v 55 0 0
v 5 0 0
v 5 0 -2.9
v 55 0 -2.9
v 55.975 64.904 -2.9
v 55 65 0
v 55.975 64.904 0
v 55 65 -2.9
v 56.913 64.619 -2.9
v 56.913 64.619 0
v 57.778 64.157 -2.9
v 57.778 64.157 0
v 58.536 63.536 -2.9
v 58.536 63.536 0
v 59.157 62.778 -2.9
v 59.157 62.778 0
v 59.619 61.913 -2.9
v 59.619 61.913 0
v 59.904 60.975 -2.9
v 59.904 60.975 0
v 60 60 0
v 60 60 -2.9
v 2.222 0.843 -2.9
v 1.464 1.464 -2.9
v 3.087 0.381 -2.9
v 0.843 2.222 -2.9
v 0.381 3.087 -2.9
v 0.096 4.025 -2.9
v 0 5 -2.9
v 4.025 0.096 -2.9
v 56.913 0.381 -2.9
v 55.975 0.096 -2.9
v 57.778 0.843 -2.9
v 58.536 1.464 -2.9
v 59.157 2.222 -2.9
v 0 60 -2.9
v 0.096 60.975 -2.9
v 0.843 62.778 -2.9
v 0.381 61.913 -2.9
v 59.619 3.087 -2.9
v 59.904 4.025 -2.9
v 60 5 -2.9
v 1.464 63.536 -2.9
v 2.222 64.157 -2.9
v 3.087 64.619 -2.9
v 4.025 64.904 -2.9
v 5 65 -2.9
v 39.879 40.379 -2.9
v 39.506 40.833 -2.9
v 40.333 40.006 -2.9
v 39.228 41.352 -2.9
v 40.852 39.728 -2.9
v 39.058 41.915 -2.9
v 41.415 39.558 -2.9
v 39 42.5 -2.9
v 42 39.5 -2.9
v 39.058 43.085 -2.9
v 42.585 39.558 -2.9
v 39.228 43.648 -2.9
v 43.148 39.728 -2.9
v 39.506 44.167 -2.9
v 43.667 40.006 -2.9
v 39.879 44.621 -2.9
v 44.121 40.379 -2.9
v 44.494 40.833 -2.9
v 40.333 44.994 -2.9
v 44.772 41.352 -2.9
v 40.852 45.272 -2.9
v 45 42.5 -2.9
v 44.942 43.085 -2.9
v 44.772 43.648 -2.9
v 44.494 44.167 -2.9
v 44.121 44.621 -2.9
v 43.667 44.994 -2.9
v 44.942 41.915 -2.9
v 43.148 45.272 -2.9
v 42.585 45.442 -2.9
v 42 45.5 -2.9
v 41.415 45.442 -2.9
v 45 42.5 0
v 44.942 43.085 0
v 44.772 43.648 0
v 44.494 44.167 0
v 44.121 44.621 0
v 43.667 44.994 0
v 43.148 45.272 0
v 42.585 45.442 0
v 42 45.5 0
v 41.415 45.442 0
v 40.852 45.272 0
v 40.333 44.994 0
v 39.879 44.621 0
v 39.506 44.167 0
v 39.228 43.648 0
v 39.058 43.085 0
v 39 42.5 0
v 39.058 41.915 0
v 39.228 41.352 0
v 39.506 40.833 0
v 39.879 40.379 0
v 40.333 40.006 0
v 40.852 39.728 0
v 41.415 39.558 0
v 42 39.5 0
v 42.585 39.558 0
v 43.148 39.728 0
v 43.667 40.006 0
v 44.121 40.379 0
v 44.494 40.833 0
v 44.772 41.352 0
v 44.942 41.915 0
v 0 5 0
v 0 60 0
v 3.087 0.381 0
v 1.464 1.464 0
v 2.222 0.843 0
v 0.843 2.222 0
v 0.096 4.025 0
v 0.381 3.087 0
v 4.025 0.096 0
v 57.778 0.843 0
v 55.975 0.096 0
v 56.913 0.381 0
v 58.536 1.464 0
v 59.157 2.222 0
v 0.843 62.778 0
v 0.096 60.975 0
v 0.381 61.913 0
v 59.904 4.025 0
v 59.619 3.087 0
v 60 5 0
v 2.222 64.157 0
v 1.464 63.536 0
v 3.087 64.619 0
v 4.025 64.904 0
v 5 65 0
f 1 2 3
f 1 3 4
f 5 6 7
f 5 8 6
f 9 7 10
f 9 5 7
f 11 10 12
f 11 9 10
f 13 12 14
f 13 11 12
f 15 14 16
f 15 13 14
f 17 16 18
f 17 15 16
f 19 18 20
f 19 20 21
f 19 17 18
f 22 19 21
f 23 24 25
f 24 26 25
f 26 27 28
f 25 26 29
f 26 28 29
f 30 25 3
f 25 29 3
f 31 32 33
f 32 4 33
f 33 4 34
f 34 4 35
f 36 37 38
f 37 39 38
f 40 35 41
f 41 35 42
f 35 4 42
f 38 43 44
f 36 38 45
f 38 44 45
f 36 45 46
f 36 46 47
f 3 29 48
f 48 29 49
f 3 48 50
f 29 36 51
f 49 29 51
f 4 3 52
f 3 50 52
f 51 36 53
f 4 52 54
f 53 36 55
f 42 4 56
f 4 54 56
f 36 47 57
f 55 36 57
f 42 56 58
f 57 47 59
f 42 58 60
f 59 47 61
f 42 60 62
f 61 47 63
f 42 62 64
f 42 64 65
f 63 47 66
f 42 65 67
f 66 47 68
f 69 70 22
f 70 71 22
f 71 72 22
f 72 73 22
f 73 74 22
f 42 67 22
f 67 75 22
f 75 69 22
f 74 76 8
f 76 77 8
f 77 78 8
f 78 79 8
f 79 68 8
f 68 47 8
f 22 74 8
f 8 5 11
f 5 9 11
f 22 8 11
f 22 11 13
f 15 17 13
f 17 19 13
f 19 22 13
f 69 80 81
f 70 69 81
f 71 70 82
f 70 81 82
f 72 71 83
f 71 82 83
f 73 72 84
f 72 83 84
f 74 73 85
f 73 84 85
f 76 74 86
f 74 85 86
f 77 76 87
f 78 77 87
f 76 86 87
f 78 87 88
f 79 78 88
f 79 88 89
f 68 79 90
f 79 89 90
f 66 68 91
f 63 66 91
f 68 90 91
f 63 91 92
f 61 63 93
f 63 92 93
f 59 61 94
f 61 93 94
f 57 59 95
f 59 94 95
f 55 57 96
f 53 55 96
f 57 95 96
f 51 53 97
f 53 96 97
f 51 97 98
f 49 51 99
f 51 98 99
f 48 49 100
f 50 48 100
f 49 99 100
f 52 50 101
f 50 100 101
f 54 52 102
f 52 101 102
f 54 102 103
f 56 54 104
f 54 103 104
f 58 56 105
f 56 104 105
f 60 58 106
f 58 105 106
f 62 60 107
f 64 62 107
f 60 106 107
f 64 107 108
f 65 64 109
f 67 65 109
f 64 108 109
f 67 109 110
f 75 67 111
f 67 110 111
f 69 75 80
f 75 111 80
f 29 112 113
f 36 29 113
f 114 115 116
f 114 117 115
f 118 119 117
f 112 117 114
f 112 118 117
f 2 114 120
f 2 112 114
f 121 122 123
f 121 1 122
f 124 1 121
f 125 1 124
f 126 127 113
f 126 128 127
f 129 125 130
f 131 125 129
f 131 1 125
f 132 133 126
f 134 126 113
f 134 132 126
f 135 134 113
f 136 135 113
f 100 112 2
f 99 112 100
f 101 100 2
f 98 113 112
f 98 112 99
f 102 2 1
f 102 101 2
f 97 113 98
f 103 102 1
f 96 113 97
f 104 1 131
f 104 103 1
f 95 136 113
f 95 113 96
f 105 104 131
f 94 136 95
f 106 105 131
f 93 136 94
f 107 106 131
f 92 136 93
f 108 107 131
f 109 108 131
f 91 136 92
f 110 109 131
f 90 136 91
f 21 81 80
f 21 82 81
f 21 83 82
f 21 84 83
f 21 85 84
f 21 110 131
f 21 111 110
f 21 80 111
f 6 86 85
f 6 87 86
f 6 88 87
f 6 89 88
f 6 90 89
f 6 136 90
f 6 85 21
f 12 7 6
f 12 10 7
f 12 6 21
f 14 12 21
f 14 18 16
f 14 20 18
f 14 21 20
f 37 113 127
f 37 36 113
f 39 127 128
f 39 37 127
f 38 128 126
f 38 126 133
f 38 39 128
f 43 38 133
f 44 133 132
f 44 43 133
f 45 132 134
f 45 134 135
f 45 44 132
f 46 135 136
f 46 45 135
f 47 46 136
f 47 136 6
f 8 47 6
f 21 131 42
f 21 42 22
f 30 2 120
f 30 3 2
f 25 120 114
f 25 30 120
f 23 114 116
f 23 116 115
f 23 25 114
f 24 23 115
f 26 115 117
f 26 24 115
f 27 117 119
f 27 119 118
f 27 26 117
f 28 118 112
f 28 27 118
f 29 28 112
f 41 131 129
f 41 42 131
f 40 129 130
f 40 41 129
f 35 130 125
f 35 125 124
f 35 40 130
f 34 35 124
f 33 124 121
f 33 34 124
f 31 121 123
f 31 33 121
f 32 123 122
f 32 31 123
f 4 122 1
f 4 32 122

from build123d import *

# Parameters (mm, degrees)
CROQUIS1_W              = 60
CROQUIS1_H              = 65
CROQUIS1_R              = 3
SALIENTE_EXTRUIR1_DEPTH = 2.9
REDONDEO2_R             = 5
REDONDEO3_R             = 5
REDONDEO4_R             = 5
REDONDEO5_R             = 5


with BuildPart() as part:
    # Croquis1 → Saliente-Extruir1 (new body)
    with BuildSketch(Plane.XY):
        with Locations((30, 32.5)):
            Rectangle(CROQUIS1_W, CROQUIS1_H)
        with Locations((42, 42.5)):
            Circle(CROQUIS1_R, mode=Mode.SUBTRACT)
    extrude(amount=-SALIENTE_EXTRUIR1_DEPTH)

    # Redondeo2
    redondeo2_edges = [part.edges().sort_by_distance(p)[0] for p in [
        (0, 65, -1.45),
    ]]
    fillet(redondeo2_edges, radius=REDONDEO2_R)

    # Redondeo3
    redondeo3_edges = [part.edges().sort_by_distance(p)[0] for p in [
        (60, 65, -1.45),
    ]]
    fillet(redondeo3_edges, radius=REDONDEO3_R)

    # Redondeo4
    redondeo4_edges = [part.edges().sort_by_distance(p)[0] for p in [
        (60, 0, -1.45),
    ]]
    fillet(redondeo4_edges, radius=REDONDEO4_R)

    # Redondeo5
    redondeo5_edges = [part.edges().sort_by_distance(p)[0] for p in [
        (0, 0, -1.45),
    ]]
    fillet(redondeo5_edges, radius=REDONDEO5_R)


solid = part.part
